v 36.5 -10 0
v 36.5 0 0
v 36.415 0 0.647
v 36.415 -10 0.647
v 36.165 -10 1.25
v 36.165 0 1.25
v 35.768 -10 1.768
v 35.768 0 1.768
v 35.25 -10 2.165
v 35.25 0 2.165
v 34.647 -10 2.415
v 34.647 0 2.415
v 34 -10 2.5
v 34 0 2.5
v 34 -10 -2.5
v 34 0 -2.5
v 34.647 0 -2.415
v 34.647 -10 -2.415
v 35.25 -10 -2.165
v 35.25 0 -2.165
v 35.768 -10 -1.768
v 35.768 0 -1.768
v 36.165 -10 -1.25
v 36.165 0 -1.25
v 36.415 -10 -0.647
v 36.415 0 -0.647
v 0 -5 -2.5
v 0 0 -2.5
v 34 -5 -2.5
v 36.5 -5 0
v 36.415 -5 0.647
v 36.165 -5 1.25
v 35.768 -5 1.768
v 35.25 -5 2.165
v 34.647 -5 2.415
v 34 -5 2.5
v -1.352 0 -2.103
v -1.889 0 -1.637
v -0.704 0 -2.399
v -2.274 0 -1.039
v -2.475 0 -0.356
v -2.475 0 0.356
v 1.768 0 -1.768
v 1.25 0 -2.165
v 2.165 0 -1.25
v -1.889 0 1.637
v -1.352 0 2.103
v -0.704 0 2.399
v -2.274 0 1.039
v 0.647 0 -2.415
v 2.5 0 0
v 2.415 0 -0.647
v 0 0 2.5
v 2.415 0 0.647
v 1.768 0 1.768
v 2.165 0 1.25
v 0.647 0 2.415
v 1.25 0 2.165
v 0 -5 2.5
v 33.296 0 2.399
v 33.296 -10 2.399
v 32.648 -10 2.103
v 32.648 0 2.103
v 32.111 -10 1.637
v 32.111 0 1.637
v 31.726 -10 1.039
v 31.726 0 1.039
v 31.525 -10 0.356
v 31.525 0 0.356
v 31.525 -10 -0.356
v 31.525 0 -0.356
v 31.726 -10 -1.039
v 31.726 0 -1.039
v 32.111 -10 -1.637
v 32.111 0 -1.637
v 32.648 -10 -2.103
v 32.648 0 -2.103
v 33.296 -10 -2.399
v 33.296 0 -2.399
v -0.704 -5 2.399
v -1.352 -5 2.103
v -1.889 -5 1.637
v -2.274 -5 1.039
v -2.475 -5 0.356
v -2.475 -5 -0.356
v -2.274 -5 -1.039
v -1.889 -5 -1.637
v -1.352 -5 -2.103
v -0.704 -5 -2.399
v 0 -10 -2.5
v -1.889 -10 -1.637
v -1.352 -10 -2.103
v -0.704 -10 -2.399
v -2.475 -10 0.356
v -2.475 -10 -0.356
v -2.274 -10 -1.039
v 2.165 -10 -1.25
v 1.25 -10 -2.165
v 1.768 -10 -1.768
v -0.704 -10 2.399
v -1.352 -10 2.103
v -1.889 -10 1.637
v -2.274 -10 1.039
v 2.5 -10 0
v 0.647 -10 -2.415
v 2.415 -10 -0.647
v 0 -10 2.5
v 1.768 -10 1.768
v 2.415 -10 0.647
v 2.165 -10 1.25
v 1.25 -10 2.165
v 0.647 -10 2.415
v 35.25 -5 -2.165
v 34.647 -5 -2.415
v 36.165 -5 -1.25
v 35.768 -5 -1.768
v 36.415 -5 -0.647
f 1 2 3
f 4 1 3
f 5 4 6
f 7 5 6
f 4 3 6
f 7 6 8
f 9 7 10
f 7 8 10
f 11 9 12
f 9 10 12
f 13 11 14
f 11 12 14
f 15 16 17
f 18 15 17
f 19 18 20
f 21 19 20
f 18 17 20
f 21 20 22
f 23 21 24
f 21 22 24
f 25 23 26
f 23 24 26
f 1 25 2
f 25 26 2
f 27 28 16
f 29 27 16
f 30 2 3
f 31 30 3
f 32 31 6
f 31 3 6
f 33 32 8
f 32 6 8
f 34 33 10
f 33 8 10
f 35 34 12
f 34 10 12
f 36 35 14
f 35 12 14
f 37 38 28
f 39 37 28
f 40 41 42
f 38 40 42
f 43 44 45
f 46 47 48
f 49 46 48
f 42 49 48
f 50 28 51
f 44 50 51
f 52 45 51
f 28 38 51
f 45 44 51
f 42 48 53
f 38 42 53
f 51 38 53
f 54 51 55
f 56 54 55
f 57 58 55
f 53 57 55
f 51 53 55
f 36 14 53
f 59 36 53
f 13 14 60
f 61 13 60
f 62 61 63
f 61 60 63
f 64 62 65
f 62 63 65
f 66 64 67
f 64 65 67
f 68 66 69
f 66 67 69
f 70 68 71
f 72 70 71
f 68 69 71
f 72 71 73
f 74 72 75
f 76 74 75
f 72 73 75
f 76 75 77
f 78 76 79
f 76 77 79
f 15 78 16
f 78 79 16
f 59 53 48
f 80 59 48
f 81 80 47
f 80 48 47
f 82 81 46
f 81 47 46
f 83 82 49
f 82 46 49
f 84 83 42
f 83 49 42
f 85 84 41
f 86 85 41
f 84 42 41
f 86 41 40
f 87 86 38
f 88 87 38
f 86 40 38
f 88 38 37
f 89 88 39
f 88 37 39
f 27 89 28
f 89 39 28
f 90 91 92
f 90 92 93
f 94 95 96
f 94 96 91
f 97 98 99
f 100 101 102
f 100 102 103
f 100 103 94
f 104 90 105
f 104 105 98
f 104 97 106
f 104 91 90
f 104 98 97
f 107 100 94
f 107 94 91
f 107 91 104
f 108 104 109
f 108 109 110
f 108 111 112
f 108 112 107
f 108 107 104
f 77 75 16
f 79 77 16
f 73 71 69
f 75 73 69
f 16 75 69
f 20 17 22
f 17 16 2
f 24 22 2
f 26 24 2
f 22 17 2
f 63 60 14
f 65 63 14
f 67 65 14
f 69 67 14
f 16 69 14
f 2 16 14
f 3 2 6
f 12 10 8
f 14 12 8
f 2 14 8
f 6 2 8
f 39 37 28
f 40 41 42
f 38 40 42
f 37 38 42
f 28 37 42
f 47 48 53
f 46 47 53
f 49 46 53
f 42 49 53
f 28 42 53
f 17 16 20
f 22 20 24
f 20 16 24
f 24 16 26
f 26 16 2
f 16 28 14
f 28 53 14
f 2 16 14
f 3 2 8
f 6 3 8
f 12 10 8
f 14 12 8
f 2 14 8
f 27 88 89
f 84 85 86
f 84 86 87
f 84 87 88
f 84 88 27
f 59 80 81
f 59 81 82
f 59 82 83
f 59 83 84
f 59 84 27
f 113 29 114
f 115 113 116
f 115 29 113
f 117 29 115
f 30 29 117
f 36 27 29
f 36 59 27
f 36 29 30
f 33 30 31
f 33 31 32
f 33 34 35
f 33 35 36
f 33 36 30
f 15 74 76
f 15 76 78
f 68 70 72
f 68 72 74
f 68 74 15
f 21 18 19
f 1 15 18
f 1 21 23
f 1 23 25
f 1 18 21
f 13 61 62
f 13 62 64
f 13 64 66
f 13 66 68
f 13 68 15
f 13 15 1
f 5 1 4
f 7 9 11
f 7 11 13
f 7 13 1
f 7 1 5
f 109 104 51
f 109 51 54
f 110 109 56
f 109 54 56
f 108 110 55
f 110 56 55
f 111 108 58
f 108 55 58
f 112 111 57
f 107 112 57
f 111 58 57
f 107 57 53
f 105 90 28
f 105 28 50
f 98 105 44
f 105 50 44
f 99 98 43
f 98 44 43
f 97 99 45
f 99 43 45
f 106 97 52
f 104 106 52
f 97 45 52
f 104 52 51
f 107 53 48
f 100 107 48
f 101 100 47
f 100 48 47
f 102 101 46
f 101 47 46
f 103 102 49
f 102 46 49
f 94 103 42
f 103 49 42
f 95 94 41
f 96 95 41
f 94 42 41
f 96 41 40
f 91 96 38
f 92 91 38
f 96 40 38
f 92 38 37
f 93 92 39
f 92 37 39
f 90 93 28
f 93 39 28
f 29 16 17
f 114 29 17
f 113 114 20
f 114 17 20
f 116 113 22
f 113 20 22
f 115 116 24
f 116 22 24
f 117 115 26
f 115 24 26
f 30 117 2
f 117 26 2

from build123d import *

# Parameters (mm, degrees)
F1_DEPTH = 10
F2_DEPTH = 5


with BuildPart() as f1:
    # F0 (on Front) → F1 (new body)
    with BuildSketch(Plane.XZ):
        with BuildLine():
            Line((0, -2.5), (0, 2.5))
            ThreePointArc((0, 2.5), (-2.5, 0), (0, -2.5))
        make_face()
        with BuildLine():
            ThreePointArc((0, -2.5), (1.767766953, -1.767766953), (2.5, 0))
            ThreePointArc((2.5, 0), (1.767766953, 1.767766953), (0, 2.5))
            Line((0, 2.5), (0, -2.5))
        make_face()
    extrude(amount=F1_DEPTH)


with BuildPart() as f1b:
    # F0 (on Front) → F1, piece 2 (new body)
    with BuildSketch(Plane.XZ):
        with BuildLine():
            Line((34, -2.5), (34, 2.5))
            ThreePointArc((34, 2.5), (31.5, 0), (34, -2.5))
        make_face()
        with BuildLine():
            ThreePointArc((36.5, 0), (35.767766953, 1.767766953), (34, 2.5))
            Line((34, 2.5), (34, -2.5))
            ThreePointArc((34, -2.5), (35.767766953, -1.767766953), (36.5, 0))
        make_face()
    extrude(amount=F1_DEPTH)


with BuildPart() as f2:
    # F0 (on Front) → F2 (new body)
    with BuildSketch(Plane.XZ):
        with BuildLine():
            ThreePointArc((0, -2.5), (1.767766953, -1.767766953), (2.5, 0))
            ThreePointArc((2.5, 0), (1.767766953, 1.767766953), (0, 2.5))
            Line((0, 2.5), (0, -2.5))
        make_face()
        with BuildLine():
            ThreePointArc((0, 2.5), (1.767766953, 1.767766953), (2.5, 0))
            ThreePointArc((2.5, 0), (1.767766953, -1.767766953), (0, -2.5))
            Line((0, -2.5), (34, -2.5))
            ThreePointArc((34, -2.5), (31.5, 0), (34, 2.5))
            Line((34, 2.5), (0, 2.5))
        make_face()
        with BuildLine():
            Line((0, -2.5), (0, 2.5))
            ThreePointArc((0, 2.5), (-2.5, 0), (0, -2.5))
        make_face()
        with BuildLine():
            Line((34, -2.5), (34, 2.5))
            ThreePointArc((34, 2.5), (31.5, 0), (34, -2.5))
        make_face()
        with BuildLine():
            ThreePointArc((36.5, 0), (35.767766953, 1.767766953), (34, 2.5))
            Line((34, 2.5), (34, -2.5))
            ThreePointArc((34, -2.5), (35.767766953, -1.767766953), (36.5, 0))
        make_face()
    extrude(amount=F2_DEPTH)


solid = Compound([f1.part, f1b.part, f2.part])
